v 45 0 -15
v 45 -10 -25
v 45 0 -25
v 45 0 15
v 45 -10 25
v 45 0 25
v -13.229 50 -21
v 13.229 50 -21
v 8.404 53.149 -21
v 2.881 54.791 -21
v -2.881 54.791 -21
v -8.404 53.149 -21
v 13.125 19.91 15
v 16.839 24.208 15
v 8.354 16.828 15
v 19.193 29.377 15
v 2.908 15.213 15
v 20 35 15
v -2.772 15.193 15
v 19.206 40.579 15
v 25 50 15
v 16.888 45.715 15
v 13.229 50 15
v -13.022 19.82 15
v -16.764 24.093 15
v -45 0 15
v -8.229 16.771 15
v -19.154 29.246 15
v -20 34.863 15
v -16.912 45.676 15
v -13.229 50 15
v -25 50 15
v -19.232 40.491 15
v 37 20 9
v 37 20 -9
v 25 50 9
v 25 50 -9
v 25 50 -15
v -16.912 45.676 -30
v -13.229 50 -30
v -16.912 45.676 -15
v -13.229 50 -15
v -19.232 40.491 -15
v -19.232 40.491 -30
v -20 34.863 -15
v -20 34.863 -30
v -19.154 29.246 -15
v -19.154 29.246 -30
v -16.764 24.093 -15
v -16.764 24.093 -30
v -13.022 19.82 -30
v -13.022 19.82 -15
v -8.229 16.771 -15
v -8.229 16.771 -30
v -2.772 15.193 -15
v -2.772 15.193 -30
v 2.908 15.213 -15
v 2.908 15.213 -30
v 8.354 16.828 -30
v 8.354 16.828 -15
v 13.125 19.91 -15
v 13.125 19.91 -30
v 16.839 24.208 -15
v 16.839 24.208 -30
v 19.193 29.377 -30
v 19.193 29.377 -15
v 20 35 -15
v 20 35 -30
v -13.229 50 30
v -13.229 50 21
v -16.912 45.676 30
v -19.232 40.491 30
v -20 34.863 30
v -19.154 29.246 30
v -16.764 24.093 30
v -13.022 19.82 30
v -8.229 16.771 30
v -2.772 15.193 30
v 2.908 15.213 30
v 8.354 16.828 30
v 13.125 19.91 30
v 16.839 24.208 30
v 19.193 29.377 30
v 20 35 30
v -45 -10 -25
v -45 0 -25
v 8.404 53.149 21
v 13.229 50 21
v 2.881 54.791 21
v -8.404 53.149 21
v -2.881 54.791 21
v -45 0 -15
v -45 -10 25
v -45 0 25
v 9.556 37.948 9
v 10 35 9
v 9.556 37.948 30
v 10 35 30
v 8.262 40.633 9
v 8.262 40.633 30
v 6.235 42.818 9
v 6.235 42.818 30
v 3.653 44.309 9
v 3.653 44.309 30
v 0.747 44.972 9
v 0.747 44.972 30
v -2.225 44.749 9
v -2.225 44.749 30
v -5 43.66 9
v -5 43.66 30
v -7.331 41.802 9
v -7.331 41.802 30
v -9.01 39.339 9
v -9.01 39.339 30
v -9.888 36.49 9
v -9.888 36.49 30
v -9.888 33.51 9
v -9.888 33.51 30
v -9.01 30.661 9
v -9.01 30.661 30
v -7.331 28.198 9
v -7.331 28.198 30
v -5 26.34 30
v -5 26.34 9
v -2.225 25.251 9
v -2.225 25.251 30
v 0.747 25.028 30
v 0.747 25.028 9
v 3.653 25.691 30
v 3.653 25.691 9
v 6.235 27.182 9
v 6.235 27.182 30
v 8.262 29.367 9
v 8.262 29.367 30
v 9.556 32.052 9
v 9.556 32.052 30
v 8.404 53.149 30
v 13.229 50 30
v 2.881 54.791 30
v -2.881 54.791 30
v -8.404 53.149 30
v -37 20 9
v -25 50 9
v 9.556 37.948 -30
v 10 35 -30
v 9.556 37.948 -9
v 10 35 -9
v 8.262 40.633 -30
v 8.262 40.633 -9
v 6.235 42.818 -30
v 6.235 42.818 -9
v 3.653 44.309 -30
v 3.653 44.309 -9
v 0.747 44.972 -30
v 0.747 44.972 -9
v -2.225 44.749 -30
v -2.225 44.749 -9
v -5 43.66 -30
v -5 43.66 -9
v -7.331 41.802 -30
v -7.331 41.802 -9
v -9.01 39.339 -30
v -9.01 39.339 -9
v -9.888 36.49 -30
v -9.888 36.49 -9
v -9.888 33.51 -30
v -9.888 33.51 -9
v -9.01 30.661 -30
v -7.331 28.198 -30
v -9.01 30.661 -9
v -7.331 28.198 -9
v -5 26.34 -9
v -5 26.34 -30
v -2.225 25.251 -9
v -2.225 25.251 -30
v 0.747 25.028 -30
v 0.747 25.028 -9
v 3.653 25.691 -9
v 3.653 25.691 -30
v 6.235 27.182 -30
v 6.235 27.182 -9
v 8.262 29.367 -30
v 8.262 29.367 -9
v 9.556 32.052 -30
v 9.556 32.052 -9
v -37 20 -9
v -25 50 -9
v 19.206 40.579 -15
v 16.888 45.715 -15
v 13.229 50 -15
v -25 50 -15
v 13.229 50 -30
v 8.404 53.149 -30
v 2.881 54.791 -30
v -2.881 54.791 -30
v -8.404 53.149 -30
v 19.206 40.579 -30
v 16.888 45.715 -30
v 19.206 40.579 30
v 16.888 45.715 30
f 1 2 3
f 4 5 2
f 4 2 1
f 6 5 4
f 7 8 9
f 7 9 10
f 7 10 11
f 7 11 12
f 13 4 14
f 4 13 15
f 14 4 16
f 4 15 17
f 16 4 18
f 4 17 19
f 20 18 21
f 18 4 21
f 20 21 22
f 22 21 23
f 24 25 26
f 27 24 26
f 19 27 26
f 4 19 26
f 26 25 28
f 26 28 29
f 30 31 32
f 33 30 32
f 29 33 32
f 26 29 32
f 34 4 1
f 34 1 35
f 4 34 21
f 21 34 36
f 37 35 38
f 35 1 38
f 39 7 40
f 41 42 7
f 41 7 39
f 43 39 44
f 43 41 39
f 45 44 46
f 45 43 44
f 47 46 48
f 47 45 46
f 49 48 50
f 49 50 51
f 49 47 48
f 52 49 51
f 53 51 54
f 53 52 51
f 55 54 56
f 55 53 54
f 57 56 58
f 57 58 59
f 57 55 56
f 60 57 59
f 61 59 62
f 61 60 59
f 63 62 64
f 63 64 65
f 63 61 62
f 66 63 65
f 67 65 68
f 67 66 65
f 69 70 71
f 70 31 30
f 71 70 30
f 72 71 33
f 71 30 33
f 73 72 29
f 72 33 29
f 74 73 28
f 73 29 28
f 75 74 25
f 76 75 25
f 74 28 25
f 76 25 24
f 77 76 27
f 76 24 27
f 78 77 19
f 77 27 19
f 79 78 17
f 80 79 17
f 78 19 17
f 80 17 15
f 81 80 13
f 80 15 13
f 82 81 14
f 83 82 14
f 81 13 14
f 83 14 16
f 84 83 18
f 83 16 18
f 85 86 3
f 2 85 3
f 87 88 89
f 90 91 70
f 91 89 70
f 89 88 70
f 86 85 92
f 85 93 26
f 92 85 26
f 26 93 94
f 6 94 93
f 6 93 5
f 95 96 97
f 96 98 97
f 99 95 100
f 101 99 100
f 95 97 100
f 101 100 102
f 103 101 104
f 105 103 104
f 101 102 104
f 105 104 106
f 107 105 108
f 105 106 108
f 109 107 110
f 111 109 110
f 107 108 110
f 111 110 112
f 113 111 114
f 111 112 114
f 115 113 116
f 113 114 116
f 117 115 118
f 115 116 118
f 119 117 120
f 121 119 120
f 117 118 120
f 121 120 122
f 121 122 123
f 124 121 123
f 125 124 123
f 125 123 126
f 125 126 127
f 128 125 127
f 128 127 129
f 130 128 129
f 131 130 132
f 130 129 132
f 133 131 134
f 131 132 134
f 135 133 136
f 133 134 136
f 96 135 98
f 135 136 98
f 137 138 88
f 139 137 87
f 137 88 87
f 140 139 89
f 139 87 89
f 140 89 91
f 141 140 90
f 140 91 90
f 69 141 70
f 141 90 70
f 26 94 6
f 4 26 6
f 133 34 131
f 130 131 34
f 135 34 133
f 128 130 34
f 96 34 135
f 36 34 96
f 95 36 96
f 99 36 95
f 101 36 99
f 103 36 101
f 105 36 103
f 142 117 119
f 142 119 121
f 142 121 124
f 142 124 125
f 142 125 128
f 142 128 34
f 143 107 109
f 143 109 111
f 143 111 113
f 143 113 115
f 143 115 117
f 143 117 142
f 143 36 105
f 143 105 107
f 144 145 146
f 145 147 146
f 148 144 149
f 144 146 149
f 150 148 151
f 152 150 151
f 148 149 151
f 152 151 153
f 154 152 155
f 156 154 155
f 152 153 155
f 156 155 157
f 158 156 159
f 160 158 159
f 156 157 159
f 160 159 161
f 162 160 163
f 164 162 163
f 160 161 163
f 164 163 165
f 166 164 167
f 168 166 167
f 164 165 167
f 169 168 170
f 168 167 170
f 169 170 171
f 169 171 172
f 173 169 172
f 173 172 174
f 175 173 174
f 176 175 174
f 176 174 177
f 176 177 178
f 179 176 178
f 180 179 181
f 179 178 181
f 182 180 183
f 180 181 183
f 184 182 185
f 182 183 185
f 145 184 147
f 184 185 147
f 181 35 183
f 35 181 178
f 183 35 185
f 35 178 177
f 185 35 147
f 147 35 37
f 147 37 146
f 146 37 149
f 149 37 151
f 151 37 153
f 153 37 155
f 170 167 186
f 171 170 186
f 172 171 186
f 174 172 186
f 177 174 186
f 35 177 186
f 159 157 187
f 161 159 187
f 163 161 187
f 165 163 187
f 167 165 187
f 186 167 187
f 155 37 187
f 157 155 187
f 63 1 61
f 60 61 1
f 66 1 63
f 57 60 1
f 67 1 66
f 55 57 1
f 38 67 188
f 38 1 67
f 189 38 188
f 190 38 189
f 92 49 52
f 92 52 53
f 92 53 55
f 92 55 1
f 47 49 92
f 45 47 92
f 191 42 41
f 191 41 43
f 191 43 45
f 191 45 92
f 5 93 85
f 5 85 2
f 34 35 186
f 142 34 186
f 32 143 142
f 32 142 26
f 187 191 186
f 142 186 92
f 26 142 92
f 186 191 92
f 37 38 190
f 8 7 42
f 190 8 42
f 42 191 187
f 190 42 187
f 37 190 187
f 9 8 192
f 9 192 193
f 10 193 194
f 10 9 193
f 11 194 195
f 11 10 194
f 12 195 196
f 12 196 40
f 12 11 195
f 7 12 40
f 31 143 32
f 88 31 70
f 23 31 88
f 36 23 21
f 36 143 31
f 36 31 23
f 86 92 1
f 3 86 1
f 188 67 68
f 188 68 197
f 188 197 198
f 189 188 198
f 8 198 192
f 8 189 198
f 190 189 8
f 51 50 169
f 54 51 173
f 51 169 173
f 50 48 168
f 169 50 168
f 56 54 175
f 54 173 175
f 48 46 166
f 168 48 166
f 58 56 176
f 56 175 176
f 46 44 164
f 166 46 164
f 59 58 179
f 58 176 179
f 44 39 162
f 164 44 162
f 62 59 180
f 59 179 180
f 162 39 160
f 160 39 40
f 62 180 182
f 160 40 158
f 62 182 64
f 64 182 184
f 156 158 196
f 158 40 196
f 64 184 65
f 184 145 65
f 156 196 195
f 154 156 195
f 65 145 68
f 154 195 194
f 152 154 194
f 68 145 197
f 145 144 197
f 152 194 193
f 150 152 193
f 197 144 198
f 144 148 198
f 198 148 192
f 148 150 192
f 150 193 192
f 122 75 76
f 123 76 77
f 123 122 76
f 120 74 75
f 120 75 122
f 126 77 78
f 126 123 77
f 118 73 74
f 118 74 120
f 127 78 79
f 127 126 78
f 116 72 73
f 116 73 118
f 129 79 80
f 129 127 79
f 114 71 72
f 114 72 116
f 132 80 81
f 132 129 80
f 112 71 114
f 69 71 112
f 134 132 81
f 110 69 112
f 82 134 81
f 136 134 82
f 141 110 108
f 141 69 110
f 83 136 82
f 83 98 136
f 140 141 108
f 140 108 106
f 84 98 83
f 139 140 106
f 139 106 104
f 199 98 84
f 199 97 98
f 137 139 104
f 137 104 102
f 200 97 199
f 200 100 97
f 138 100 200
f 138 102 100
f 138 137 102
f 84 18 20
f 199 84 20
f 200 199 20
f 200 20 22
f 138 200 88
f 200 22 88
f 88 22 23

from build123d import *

# Parameters (mm, degrees)
SKETCH1_W           = 90
SKETCH1_H           = 10
BOSS_EXTRUDE1_DEPTH = 25
BOSS_EXTRUDE2_START = 9
SKETCH1_3_R         = 20
SKETCH1_3_R_2       = 10
BOSS_EXTRUDE2_DEPTH = 6
BOSS_EXTRUDE3_START = 15
SKETCH1_4_R         = 10
BOSS_EXTRUDE3_DEPTH = 15
SKETCH1_5_R         = 10
CUT_EXTRUDE1_DEPTH  = 47.5
SKETCH2_W           = 42
SKETCH2_H           = 15
CUT_EXTRUDE2_DEPTH  = 110.658560997
BOSS_EXTRUDE4_START = -6
BOSS_EXTRUDE4_DEPTH = 18


with BuildPart() as part:
    # Sketch1 → Boss-Extrude1 (new, symmetric)
    with BuildSketch(Plane.XY):
        with Locations((0, -5)):
            Rectangle(SKETCH1_W, SKETCH1_H)
    extrude(amount=BOSS_EXTRUDE1_DEPTH, both=True)

    # Sketch1<3> → Boss-Extrude2 (add)
    # profile 1 of 3: a face of its own
    with BuildSketch(Plane.XY.offset(BOSS_EXTRUDE2_START)):
        Polygon((-25, 50), (25, 50), (45, 0), (-45, 0), align=None)
        with Locations((0, 35)):
            Circle(SKETCH1_3_R, mode=Mode.SUBTRACT)
    # profile 2 of 3: a face of its own
    with BuildSketch(Plane.XY.offset(BOSS_EXTRUDE2_START)):
        with BuildLine():
            Line((13.228756555, 50), (-13.228756555, 50))
            ThreePointArc((-13.228756555, 50), (-8.228756555, 16.771243445), (20, 35))
            ThreePointArc((20, 35), (18.228756555, 43.228756555), (13.228756555, 50))
        make_face()
        with Locations((0, 35)):
            Circle(SKETCH1_3_R_2, mode=Mode.SUBTRACT)
    # profile 3 of 3: a face of its own
    with BuildSketch(Plane.XY.offset(BOSS_EXTRUDE2_START)):
        with Locations((0, 35)):
            Circle(SKETCH1_3_R_2)
    boss_extrude2 = extrude(amount=BOSS_EXTRUDE2_DEPTH)

    # Mirror1: Boss-Extrude2 across plane
    add(boss_extrude2.mirror(Plane.XY))

    # Sketch1<4> → Boss-Extrude3 (add)
    # profile 1 of 2: a face of its own
    with BuildSketch(Plane.XY.offset(BOSS_EXTRUDE3_START)):
        with BuildLine():
            Line((13.228756555, 50), (-13.228756555, 50))
            ThreePointArc((-13.228756555, 50), (-8.228756555, 16.771243445), (20, 35))
            ThreePointArc((20, 35), (18.228756555, 43.228756555), (13.228756555, 50))
        make_face()
        with Locations((0, 35)):
            Circle(SKETCH1_4_R, mode=Mode.SUBTRACT)
    # profile 2 of 2: a face of its own
    with BuildSketch(Plane.XY.offset(BOSS_EXTRUDE3_START)):
        with BuildLine():
            ThreePointArc((13.228756555, 50), (0, 55), (-13.228756555, 50))
            Line((-13.228756555, 50), (13.228756555, 50))
        make_face()
    boss_extrude3 = extrude(amount=BOSS_EXTRUDE3_DEPTH)

    # Mirror2: Boss-Extrude3 across plane
    add(boss_extrude3.mirror(Plane.XY))

    # Sketch1<5> → Cut-Extrude1 (cut, symmetric)
    with BuildSketch(Plane.XY):
        with Locations((0, 35)):
            Circle(SKETCH1_5_R)
    extrude(amount=CUT_EXTRUDE1_DEPTH, both=True, mode=Mode.SUBTRACT)

    # Sketch2 → Cut-Extrude2 (cut, through all)
    with BuildSketch(Plane.ZY.offset(45)):
        with Locations((0, 57.5)):
            Rectangle(SKETCH2_W, SKETCH2_H)
    extrude(amount=-CUT_EXTRUDE2_DEPTH, mode=Mode.SUBTRACT)

    # Sketch3 → Boss-Extrude4 (add)
    with BuildSketch(Plane(origin=(0, 0, -15), x_dir=(-1, 0, 0), z_dir=(0, 0, -1)).offset(BOSS_EXTRUDE4_START)):
        Polygon((-45, 0), (-37, 20), (37, 20), (45, 0), align=None)
    extrude(amount=-BOSS_EXTRUDE4_DEPTH)


solid = part.part
